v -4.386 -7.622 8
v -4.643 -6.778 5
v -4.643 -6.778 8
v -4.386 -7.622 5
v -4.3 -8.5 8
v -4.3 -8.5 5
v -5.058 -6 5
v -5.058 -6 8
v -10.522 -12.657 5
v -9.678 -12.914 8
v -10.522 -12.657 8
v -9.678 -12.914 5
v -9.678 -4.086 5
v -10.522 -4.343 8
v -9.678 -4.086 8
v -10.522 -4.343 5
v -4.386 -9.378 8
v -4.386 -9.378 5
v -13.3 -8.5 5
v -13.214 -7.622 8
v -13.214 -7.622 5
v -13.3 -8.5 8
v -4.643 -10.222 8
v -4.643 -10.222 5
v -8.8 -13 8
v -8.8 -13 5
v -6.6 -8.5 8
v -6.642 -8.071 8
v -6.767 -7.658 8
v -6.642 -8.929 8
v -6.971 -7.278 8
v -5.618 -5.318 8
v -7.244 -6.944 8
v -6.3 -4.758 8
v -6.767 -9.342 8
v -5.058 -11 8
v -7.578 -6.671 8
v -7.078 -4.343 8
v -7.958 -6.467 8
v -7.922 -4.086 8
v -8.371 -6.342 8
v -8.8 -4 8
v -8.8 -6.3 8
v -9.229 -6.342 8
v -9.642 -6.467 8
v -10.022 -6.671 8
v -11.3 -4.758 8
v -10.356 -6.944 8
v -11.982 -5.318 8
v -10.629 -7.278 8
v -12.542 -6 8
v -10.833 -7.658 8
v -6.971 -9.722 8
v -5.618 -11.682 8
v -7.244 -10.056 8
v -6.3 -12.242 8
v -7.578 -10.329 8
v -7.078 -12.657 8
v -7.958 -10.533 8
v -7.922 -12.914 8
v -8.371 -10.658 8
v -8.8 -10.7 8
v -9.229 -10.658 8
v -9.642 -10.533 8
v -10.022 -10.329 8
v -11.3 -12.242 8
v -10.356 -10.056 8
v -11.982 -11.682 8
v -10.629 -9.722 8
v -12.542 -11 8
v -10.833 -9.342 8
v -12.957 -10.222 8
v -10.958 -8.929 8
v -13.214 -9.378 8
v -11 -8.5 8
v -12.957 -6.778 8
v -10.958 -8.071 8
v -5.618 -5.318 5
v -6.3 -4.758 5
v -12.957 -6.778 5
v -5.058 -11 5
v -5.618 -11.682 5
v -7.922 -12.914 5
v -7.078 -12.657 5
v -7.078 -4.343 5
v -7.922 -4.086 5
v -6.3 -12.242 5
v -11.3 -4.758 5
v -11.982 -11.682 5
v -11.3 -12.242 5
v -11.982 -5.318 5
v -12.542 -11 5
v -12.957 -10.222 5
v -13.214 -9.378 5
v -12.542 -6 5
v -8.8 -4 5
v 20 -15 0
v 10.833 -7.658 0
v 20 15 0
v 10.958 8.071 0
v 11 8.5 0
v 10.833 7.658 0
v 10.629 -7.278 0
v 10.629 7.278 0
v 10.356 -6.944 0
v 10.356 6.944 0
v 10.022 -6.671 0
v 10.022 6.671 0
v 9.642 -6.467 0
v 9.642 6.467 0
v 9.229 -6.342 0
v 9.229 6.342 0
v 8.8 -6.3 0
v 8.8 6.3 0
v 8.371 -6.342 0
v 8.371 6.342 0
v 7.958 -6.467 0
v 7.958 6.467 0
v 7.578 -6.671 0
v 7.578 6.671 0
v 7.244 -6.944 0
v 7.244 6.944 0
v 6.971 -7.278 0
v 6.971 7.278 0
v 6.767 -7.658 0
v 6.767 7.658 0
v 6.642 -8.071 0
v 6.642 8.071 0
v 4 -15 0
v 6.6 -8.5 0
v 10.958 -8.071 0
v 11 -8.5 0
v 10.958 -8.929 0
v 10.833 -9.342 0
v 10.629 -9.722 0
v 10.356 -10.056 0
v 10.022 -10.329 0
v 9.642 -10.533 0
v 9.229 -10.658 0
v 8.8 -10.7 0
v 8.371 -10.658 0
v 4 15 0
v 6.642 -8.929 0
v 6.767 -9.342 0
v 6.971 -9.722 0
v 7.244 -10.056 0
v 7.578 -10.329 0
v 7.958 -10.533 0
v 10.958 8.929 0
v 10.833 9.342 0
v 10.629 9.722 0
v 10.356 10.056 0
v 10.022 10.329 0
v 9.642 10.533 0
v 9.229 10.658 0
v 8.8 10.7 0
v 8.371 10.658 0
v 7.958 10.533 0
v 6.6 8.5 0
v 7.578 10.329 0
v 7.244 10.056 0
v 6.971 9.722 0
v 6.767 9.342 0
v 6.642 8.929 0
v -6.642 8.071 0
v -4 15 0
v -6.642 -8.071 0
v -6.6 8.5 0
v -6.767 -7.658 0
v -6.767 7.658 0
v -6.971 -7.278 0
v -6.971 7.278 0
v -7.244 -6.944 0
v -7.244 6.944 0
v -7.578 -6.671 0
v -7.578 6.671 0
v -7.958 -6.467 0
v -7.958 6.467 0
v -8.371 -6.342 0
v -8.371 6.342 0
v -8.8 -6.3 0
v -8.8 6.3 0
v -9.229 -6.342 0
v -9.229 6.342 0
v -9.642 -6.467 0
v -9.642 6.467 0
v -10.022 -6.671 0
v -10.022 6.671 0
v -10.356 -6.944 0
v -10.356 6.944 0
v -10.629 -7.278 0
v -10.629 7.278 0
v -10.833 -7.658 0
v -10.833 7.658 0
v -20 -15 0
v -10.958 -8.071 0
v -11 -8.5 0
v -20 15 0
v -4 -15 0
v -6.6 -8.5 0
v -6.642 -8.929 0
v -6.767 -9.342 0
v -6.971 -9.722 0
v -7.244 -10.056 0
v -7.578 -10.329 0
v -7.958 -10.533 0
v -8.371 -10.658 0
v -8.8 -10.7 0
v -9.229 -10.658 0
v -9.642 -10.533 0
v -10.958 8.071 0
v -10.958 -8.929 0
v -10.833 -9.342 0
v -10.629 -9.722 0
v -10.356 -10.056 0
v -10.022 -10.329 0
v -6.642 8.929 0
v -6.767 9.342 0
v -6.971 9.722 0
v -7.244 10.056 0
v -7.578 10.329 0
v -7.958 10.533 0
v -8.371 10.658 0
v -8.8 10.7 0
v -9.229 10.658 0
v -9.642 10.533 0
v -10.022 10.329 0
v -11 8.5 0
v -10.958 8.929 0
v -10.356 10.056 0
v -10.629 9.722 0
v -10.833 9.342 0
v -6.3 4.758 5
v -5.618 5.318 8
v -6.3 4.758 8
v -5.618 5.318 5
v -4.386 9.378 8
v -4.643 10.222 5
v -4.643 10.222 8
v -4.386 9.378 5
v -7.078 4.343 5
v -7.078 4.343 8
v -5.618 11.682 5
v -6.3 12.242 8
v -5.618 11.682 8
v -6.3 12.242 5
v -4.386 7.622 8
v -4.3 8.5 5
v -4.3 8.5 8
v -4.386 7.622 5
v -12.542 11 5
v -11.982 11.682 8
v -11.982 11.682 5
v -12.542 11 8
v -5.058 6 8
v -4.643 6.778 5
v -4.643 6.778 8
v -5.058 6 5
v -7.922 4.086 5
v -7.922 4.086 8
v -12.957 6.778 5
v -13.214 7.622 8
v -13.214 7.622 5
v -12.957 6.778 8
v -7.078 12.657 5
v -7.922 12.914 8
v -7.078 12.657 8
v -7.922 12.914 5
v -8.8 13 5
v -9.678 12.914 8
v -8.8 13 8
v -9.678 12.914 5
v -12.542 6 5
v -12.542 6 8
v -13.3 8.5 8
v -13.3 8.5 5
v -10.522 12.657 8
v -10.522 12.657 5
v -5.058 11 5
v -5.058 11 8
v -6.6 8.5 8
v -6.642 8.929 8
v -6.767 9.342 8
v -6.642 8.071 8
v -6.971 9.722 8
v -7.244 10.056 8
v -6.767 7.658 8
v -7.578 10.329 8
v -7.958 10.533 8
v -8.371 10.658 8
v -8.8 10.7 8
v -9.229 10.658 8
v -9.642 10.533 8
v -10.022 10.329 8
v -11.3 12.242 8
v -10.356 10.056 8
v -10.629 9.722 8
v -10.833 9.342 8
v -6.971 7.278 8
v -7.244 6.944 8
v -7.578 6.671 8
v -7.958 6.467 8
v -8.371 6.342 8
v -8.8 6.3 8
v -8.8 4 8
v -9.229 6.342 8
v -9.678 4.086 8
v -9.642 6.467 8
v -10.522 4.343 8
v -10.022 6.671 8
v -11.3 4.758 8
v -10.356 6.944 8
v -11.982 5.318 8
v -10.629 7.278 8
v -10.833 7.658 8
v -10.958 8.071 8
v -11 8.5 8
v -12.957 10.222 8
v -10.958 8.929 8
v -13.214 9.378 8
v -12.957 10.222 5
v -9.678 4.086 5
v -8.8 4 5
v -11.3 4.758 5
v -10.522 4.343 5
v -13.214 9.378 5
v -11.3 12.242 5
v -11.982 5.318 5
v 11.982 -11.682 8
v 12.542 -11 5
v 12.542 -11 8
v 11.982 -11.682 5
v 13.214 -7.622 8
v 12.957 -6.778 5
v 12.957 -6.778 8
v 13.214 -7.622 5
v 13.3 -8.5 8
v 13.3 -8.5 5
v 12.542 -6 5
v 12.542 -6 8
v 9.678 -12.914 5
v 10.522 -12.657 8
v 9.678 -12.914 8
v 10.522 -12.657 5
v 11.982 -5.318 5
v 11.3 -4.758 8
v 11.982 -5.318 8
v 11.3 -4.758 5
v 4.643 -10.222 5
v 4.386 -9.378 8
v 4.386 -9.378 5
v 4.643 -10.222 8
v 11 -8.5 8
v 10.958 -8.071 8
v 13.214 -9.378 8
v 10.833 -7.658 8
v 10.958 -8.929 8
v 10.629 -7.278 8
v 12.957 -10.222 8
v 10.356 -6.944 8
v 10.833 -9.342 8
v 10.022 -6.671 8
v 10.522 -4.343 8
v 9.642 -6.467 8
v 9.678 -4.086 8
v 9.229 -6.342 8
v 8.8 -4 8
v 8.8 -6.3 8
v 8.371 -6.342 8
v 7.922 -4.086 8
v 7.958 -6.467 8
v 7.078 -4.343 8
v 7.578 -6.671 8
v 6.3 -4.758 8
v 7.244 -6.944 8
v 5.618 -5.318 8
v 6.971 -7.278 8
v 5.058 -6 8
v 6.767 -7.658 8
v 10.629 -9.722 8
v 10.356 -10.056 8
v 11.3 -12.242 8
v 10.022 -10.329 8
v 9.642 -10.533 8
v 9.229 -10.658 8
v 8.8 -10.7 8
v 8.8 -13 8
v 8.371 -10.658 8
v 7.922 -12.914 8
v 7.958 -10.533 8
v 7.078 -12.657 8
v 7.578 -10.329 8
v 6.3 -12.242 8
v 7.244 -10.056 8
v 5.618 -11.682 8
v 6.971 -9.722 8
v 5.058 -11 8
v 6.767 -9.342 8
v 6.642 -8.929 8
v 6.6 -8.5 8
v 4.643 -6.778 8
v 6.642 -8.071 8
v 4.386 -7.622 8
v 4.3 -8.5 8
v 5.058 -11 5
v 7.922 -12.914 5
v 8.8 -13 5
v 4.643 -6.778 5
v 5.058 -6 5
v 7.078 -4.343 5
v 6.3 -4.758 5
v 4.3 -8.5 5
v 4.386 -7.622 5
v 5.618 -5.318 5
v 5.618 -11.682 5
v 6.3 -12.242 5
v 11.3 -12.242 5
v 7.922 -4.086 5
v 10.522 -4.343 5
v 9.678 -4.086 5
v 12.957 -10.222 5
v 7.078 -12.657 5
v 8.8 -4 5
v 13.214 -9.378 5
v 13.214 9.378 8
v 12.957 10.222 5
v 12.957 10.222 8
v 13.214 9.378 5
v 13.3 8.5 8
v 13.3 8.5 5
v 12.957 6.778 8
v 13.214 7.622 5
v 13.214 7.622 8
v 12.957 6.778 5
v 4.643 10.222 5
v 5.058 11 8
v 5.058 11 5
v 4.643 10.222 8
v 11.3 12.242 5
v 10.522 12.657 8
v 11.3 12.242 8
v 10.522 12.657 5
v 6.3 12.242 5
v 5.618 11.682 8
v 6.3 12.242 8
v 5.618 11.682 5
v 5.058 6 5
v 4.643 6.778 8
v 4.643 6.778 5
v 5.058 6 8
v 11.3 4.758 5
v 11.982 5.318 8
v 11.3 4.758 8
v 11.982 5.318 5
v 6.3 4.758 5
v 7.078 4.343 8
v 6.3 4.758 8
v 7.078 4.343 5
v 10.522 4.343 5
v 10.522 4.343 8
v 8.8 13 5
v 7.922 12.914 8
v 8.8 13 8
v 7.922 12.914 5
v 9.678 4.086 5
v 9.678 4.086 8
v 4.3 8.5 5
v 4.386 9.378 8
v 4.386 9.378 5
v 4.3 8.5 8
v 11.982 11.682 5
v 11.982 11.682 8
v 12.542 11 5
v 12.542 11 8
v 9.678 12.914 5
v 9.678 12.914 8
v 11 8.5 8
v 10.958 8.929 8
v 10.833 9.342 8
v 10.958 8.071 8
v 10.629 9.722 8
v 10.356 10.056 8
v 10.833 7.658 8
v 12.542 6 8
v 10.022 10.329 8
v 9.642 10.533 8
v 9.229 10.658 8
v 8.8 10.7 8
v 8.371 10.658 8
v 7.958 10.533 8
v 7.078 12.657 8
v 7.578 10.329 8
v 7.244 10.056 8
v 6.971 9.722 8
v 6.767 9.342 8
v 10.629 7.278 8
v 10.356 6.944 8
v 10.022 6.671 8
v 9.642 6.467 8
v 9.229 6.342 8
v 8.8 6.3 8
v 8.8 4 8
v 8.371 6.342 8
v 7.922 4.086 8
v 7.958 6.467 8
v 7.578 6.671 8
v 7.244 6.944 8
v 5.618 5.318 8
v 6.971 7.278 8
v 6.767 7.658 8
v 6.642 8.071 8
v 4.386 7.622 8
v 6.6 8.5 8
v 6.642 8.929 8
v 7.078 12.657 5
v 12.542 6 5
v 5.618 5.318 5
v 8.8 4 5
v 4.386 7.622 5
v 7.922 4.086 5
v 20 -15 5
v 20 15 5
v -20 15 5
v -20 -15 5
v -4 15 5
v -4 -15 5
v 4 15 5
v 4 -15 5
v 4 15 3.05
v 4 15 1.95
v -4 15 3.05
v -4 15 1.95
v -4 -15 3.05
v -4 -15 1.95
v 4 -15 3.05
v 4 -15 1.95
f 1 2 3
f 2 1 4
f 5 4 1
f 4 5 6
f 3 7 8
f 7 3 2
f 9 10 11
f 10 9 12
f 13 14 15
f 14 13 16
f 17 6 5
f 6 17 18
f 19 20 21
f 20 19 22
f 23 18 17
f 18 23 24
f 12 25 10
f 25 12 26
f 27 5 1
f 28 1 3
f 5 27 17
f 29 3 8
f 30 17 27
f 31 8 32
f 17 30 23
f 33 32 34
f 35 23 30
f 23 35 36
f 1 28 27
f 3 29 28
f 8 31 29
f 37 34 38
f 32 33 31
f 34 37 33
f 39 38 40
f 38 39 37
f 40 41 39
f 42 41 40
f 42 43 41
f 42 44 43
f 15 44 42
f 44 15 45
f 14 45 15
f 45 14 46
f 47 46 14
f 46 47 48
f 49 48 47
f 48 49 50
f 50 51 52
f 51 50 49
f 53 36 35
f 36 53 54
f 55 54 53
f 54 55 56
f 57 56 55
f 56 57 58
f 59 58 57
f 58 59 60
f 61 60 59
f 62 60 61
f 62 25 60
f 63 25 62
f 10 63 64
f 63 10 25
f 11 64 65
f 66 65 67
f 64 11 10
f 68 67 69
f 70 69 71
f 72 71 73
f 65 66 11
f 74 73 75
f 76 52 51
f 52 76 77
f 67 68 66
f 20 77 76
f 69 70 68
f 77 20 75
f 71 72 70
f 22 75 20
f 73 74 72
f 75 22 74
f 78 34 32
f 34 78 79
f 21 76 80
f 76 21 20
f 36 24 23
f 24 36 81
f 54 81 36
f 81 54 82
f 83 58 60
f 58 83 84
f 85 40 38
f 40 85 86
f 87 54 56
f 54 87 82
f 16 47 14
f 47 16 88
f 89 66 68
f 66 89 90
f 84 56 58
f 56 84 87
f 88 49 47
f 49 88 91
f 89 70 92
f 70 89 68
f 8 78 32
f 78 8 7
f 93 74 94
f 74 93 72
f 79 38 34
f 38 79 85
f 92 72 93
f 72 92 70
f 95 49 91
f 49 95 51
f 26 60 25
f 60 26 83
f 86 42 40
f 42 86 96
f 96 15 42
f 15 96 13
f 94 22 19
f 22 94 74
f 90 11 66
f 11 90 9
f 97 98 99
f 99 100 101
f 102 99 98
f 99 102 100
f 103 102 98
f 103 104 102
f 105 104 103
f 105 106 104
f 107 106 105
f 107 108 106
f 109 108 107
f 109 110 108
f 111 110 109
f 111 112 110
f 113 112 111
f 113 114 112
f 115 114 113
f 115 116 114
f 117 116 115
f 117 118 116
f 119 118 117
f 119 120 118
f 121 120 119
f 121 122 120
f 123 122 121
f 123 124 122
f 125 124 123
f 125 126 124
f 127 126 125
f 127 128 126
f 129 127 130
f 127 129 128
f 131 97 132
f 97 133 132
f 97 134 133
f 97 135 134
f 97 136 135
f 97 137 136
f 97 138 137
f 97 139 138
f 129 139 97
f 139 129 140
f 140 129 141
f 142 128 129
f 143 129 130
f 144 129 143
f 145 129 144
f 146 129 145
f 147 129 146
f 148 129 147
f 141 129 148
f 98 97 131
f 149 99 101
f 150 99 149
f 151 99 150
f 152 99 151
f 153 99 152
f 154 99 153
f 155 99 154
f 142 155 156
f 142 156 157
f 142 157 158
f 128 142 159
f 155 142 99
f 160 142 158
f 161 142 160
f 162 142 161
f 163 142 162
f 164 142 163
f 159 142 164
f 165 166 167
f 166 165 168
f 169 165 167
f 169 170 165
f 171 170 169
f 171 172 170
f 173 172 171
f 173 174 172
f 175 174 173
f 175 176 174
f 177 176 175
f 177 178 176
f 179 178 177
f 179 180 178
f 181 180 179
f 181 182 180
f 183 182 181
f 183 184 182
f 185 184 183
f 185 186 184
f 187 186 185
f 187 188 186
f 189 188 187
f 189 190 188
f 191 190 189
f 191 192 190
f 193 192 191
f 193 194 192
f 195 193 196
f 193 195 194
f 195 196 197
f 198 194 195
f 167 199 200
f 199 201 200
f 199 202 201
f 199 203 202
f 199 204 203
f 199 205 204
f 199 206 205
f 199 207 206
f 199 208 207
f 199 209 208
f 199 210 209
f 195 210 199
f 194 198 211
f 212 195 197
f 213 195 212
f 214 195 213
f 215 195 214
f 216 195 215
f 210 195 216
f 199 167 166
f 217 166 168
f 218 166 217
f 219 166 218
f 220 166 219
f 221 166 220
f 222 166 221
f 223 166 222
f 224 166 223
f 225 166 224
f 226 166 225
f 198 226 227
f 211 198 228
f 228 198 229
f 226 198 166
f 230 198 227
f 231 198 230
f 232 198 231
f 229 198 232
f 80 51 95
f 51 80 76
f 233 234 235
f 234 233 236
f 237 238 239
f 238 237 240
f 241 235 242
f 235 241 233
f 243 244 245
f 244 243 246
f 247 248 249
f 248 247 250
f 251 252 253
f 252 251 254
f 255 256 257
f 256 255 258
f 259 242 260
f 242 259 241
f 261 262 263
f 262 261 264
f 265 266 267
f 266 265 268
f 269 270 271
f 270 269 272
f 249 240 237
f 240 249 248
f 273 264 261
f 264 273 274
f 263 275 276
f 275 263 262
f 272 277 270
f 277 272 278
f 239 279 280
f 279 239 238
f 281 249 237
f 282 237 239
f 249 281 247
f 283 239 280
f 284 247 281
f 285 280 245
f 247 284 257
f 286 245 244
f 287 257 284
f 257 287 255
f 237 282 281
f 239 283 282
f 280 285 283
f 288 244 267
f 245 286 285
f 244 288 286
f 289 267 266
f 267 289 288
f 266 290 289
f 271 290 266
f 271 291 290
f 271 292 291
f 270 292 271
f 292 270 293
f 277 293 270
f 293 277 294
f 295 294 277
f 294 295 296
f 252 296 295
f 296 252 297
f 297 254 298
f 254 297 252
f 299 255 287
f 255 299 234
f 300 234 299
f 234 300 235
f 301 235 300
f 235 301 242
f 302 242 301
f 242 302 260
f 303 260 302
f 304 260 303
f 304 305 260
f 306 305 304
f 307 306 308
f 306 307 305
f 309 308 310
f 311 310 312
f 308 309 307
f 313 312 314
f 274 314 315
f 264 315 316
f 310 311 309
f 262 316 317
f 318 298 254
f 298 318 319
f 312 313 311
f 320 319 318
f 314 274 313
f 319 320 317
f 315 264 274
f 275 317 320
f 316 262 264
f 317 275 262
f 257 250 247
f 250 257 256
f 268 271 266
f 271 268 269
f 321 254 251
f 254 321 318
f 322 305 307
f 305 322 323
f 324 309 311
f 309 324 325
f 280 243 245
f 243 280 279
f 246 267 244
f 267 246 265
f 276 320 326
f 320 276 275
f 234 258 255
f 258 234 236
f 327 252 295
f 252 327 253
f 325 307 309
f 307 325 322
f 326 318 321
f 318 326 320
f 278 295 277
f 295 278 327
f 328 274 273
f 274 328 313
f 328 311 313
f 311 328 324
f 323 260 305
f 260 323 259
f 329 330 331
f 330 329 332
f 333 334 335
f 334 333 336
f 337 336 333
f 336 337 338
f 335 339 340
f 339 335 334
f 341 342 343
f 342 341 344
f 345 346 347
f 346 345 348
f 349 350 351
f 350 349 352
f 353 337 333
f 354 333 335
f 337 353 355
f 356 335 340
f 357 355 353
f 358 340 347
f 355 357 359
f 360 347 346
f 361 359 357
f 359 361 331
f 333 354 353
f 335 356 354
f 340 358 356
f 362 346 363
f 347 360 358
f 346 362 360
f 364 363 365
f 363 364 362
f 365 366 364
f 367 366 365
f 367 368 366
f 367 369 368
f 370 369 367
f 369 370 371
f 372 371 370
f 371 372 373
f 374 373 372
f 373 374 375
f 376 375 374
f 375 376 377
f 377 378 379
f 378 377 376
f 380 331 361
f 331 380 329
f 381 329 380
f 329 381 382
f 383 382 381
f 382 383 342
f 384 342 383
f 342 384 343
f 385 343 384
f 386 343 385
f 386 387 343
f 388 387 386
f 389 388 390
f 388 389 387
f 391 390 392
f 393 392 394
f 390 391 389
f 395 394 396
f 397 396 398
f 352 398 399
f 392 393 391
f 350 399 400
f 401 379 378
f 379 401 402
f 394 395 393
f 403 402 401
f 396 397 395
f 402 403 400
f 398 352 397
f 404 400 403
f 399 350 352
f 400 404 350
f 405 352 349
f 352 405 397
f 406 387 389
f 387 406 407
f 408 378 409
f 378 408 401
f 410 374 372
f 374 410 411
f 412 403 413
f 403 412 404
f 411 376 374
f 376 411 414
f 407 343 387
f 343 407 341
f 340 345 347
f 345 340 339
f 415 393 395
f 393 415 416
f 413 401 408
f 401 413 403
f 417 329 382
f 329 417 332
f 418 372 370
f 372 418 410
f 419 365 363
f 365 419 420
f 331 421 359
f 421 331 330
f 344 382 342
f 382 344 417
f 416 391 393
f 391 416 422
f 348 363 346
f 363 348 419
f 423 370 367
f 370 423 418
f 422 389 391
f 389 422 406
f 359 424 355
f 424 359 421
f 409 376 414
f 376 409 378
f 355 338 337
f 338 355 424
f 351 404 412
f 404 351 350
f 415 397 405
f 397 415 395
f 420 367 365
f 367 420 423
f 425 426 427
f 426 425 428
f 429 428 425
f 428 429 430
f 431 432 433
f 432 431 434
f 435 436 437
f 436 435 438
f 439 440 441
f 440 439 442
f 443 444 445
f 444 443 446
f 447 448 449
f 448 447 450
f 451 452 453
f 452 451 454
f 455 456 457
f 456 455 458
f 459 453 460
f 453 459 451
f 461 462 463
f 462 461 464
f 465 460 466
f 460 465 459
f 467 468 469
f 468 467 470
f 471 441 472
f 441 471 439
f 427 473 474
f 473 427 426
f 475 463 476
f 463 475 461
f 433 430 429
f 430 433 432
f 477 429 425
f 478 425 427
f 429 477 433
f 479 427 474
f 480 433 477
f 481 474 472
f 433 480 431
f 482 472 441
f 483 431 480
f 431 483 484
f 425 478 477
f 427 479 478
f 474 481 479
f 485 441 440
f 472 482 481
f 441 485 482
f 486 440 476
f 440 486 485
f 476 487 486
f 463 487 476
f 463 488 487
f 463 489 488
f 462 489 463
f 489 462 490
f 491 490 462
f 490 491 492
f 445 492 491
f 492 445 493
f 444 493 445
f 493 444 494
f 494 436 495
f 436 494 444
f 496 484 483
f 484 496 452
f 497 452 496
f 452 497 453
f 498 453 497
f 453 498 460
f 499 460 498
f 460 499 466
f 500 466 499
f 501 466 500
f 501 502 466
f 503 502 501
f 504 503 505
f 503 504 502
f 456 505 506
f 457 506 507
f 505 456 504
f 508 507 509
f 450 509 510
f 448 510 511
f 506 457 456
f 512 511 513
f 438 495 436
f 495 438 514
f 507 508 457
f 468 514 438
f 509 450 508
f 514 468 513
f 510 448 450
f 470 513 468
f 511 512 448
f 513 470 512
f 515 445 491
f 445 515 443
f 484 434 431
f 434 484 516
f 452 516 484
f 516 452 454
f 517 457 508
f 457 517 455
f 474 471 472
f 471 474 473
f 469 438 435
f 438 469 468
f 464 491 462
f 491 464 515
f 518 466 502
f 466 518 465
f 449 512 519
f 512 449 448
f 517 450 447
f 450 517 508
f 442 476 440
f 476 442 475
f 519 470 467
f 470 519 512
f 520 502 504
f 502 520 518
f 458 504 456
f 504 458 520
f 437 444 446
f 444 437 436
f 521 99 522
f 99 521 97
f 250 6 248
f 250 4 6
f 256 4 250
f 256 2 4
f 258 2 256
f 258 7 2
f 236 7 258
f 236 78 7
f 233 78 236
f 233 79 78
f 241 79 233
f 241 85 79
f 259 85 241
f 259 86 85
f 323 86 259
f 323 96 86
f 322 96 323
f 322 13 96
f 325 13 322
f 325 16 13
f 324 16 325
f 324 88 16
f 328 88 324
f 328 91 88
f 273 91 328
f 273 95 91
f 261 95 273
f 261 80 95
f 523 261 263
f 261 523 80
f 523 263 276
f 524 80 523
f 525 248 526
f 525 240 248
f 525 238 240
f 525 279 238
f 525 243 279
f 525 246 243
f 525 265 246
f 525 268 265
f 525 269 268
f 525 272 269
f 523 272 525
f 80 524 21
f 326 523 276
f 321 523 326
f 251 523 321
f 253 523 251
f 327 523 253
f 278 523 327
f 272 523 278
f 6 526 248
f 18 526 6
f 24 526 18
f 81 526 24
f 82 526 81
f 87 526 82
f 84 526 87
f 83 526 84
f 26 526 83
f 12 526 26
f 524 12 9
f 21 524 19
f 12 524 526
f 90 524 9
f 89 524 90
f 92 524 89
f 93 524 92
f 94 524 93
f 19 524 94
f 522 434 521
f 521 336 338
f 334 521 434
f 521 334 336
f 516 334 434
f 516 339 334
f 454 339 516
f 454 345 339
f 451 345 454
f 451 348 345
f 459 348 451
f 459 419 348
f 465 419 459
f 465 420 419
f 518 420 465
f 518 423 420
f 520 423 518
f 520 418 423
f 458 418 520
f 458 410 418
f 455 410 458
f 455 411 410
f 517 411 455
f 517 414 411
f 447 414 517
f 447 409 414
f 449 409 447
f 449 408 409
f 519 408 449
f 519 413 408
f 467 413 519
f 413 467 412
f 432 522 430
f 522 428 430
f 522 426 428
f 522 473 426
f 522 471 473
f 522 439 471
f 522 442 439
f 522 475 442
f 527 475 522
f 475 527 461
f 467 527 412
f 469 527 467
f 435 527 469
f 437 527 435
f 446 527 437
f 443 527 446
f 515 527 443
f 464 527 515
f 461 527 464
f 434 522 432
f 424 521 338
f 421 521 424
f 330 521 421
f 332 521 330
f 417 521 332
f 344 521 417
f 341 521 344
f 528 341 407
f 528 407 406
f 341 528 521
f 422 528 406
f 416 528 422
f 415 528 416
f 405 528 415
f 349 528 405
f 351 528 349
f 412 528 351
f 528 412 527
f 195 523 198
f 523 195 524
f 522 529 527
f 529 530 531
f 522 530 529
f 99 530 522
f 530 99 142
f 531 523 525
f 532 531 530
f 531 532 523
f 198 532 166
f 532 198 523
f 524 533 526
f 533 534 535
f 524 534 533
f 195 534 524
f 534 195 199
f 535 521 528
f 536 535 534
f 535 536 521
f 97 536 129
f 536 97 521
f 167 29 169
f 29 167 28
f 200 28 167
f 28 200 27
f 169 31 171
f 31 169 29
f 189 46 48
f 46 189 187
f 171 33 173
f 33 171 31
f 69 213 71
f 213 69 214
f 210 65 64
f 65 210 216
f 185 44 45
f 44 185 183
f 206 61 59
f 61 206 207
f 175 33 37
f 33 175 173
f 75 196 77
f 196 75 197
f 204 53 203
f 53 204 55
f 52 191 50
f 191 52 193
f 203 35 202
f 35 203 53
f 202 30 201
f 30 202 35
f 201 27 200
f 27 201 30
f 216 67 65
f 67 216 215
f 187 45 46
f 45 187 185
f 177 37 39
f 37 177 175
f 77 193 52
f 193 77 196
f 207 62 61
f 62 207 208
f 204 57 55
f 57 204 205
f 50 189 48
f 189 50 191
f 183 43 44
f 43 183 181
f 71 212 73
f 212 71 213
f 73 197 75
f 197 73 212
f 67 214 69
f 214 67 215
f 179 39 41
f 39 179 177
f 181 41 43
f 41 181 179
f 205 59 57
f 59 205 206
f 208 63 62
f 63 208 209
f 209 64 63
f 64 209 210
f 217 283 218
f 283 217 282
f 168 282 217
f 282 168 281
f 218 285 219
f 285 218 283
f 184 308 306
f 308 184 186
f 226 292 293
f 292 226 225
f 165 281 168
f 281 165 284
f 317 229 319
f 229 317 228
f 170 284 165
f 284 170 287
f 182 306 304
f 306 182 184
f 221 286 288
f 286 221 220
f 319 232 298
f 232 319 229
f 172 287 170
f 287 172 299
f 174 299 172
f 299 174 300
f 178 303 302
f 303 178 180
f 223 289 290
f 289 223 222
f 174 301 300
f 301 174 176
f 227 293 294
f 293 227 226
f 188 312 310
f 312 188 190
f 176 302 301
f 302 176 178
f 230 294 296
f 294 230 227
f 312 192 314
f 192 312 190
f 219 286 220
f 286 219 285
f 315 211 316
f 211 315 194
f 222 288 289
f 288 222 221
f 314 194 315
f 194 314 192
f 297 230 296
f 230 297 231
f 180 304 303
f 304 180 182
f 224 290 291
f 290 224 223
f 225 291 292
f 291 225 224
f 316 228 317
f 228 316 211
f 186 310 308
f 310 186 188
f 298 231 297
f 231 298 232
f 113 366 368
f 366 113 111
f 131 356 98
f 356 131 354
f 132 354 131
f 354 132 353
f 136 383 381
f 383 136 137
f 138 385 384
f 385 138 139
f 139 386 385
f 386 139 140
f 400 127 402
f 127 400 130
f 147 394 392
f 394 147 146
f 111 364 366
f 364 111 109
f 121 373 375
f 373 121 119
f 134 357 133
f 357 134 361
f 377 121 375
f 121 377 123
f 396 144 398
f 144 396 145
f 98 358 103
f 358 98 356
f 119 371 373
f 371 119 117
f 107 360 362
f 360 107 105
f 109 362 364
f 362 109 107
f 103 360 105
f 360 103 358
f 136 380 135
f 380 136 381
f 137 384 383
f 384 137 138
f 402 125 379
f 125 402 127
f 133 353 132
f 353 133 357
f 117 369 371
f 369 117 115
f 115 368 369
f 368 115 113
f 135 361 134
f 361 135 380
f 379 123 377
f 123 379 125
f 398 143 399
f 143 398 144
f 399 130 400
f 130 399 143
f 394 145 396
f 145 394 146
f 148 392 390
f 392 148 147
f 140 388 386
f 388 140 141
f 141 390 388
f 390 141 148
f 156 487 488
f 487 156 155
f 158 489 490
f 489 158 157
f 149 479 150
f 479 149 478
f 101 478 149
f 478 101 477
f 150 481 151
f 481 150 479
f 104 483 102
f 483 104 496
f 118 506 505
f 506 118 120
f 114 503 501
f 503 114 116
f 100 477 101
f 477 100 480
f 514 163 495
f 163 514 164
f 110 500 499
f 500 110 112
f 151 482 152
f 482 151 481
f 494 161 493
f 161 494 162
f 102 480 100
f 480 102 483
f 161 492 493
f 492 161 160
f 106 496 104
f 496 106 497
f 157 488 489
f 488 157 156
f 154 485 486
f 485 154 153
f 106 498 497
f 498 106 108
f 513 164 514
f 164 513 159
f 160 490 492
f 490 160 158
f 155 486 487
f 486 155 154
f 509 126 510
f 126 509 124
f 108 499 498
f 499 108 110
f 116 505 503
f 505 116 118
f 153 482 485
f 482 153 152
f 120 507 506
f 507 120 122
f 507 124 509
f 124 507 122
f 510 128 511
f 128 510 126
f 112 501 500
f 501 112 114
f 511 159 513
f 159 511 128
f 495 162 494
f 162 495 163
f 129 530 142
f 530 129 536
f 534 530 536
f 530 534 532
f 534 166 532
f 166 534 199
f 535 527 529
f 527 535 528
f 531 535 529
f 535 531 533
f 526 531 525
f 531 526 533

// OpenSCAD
$fn = 32;

// ----------------------------------------------------------------------
// Living hinge: 40 x 30 mm plates, 1.1 mm flexible web
// ----------------------------------------------------------------------

// --- parameters (mm) ---
plate_len = 16;           // plate length outside the web
plate_w = 30;             // plate width
thick = 5;                // plate thickness
web_half = 4;             // half width of the flex band
web_t = 1.1;              // flexible web thickness
web_z = 1.95;             // web position inside the thickness
boss_d = 9;               // screw boss diameter
boss_h = 8;               // screw boss height
boss_x = 8.8;             // screw boss distance from the web
screw_d = 4.4;            // screw hole

difference() {
  union() {
    /* one flat strip, later thinned at the middle */
    translate([-20, -15, 0]) cube([40, 30, 5]);
    /* screw bosses, sunk 0.5 mm into the plates */
    for (sx = [-8.8, 8.8]) {
      for (sy = [-8.5, 8.5]) {
        translate([sx, sy, 0]) cylinder(h = boss_h, d = boss_d);
      }
    }
  }
  /* channel from below: leaves the web on top of it */
  translate([-4, -17.5, -2.5]) cube([8, 35, 4.45]);
  /* channel from above: thins the web down to web_t */
  translate([-4, -17.5, 3.05]) cube([8, 35, 4.45]);
  /* screw holes through the bosses */
  for (sx = [-8.8, 8.8]) {
    for (sy = [-8.5, 8.5]) {
      translate([sx, sy, -2.5]) cylinder(h = boss_h + 5, d = screw_d);
    }
  }
}
